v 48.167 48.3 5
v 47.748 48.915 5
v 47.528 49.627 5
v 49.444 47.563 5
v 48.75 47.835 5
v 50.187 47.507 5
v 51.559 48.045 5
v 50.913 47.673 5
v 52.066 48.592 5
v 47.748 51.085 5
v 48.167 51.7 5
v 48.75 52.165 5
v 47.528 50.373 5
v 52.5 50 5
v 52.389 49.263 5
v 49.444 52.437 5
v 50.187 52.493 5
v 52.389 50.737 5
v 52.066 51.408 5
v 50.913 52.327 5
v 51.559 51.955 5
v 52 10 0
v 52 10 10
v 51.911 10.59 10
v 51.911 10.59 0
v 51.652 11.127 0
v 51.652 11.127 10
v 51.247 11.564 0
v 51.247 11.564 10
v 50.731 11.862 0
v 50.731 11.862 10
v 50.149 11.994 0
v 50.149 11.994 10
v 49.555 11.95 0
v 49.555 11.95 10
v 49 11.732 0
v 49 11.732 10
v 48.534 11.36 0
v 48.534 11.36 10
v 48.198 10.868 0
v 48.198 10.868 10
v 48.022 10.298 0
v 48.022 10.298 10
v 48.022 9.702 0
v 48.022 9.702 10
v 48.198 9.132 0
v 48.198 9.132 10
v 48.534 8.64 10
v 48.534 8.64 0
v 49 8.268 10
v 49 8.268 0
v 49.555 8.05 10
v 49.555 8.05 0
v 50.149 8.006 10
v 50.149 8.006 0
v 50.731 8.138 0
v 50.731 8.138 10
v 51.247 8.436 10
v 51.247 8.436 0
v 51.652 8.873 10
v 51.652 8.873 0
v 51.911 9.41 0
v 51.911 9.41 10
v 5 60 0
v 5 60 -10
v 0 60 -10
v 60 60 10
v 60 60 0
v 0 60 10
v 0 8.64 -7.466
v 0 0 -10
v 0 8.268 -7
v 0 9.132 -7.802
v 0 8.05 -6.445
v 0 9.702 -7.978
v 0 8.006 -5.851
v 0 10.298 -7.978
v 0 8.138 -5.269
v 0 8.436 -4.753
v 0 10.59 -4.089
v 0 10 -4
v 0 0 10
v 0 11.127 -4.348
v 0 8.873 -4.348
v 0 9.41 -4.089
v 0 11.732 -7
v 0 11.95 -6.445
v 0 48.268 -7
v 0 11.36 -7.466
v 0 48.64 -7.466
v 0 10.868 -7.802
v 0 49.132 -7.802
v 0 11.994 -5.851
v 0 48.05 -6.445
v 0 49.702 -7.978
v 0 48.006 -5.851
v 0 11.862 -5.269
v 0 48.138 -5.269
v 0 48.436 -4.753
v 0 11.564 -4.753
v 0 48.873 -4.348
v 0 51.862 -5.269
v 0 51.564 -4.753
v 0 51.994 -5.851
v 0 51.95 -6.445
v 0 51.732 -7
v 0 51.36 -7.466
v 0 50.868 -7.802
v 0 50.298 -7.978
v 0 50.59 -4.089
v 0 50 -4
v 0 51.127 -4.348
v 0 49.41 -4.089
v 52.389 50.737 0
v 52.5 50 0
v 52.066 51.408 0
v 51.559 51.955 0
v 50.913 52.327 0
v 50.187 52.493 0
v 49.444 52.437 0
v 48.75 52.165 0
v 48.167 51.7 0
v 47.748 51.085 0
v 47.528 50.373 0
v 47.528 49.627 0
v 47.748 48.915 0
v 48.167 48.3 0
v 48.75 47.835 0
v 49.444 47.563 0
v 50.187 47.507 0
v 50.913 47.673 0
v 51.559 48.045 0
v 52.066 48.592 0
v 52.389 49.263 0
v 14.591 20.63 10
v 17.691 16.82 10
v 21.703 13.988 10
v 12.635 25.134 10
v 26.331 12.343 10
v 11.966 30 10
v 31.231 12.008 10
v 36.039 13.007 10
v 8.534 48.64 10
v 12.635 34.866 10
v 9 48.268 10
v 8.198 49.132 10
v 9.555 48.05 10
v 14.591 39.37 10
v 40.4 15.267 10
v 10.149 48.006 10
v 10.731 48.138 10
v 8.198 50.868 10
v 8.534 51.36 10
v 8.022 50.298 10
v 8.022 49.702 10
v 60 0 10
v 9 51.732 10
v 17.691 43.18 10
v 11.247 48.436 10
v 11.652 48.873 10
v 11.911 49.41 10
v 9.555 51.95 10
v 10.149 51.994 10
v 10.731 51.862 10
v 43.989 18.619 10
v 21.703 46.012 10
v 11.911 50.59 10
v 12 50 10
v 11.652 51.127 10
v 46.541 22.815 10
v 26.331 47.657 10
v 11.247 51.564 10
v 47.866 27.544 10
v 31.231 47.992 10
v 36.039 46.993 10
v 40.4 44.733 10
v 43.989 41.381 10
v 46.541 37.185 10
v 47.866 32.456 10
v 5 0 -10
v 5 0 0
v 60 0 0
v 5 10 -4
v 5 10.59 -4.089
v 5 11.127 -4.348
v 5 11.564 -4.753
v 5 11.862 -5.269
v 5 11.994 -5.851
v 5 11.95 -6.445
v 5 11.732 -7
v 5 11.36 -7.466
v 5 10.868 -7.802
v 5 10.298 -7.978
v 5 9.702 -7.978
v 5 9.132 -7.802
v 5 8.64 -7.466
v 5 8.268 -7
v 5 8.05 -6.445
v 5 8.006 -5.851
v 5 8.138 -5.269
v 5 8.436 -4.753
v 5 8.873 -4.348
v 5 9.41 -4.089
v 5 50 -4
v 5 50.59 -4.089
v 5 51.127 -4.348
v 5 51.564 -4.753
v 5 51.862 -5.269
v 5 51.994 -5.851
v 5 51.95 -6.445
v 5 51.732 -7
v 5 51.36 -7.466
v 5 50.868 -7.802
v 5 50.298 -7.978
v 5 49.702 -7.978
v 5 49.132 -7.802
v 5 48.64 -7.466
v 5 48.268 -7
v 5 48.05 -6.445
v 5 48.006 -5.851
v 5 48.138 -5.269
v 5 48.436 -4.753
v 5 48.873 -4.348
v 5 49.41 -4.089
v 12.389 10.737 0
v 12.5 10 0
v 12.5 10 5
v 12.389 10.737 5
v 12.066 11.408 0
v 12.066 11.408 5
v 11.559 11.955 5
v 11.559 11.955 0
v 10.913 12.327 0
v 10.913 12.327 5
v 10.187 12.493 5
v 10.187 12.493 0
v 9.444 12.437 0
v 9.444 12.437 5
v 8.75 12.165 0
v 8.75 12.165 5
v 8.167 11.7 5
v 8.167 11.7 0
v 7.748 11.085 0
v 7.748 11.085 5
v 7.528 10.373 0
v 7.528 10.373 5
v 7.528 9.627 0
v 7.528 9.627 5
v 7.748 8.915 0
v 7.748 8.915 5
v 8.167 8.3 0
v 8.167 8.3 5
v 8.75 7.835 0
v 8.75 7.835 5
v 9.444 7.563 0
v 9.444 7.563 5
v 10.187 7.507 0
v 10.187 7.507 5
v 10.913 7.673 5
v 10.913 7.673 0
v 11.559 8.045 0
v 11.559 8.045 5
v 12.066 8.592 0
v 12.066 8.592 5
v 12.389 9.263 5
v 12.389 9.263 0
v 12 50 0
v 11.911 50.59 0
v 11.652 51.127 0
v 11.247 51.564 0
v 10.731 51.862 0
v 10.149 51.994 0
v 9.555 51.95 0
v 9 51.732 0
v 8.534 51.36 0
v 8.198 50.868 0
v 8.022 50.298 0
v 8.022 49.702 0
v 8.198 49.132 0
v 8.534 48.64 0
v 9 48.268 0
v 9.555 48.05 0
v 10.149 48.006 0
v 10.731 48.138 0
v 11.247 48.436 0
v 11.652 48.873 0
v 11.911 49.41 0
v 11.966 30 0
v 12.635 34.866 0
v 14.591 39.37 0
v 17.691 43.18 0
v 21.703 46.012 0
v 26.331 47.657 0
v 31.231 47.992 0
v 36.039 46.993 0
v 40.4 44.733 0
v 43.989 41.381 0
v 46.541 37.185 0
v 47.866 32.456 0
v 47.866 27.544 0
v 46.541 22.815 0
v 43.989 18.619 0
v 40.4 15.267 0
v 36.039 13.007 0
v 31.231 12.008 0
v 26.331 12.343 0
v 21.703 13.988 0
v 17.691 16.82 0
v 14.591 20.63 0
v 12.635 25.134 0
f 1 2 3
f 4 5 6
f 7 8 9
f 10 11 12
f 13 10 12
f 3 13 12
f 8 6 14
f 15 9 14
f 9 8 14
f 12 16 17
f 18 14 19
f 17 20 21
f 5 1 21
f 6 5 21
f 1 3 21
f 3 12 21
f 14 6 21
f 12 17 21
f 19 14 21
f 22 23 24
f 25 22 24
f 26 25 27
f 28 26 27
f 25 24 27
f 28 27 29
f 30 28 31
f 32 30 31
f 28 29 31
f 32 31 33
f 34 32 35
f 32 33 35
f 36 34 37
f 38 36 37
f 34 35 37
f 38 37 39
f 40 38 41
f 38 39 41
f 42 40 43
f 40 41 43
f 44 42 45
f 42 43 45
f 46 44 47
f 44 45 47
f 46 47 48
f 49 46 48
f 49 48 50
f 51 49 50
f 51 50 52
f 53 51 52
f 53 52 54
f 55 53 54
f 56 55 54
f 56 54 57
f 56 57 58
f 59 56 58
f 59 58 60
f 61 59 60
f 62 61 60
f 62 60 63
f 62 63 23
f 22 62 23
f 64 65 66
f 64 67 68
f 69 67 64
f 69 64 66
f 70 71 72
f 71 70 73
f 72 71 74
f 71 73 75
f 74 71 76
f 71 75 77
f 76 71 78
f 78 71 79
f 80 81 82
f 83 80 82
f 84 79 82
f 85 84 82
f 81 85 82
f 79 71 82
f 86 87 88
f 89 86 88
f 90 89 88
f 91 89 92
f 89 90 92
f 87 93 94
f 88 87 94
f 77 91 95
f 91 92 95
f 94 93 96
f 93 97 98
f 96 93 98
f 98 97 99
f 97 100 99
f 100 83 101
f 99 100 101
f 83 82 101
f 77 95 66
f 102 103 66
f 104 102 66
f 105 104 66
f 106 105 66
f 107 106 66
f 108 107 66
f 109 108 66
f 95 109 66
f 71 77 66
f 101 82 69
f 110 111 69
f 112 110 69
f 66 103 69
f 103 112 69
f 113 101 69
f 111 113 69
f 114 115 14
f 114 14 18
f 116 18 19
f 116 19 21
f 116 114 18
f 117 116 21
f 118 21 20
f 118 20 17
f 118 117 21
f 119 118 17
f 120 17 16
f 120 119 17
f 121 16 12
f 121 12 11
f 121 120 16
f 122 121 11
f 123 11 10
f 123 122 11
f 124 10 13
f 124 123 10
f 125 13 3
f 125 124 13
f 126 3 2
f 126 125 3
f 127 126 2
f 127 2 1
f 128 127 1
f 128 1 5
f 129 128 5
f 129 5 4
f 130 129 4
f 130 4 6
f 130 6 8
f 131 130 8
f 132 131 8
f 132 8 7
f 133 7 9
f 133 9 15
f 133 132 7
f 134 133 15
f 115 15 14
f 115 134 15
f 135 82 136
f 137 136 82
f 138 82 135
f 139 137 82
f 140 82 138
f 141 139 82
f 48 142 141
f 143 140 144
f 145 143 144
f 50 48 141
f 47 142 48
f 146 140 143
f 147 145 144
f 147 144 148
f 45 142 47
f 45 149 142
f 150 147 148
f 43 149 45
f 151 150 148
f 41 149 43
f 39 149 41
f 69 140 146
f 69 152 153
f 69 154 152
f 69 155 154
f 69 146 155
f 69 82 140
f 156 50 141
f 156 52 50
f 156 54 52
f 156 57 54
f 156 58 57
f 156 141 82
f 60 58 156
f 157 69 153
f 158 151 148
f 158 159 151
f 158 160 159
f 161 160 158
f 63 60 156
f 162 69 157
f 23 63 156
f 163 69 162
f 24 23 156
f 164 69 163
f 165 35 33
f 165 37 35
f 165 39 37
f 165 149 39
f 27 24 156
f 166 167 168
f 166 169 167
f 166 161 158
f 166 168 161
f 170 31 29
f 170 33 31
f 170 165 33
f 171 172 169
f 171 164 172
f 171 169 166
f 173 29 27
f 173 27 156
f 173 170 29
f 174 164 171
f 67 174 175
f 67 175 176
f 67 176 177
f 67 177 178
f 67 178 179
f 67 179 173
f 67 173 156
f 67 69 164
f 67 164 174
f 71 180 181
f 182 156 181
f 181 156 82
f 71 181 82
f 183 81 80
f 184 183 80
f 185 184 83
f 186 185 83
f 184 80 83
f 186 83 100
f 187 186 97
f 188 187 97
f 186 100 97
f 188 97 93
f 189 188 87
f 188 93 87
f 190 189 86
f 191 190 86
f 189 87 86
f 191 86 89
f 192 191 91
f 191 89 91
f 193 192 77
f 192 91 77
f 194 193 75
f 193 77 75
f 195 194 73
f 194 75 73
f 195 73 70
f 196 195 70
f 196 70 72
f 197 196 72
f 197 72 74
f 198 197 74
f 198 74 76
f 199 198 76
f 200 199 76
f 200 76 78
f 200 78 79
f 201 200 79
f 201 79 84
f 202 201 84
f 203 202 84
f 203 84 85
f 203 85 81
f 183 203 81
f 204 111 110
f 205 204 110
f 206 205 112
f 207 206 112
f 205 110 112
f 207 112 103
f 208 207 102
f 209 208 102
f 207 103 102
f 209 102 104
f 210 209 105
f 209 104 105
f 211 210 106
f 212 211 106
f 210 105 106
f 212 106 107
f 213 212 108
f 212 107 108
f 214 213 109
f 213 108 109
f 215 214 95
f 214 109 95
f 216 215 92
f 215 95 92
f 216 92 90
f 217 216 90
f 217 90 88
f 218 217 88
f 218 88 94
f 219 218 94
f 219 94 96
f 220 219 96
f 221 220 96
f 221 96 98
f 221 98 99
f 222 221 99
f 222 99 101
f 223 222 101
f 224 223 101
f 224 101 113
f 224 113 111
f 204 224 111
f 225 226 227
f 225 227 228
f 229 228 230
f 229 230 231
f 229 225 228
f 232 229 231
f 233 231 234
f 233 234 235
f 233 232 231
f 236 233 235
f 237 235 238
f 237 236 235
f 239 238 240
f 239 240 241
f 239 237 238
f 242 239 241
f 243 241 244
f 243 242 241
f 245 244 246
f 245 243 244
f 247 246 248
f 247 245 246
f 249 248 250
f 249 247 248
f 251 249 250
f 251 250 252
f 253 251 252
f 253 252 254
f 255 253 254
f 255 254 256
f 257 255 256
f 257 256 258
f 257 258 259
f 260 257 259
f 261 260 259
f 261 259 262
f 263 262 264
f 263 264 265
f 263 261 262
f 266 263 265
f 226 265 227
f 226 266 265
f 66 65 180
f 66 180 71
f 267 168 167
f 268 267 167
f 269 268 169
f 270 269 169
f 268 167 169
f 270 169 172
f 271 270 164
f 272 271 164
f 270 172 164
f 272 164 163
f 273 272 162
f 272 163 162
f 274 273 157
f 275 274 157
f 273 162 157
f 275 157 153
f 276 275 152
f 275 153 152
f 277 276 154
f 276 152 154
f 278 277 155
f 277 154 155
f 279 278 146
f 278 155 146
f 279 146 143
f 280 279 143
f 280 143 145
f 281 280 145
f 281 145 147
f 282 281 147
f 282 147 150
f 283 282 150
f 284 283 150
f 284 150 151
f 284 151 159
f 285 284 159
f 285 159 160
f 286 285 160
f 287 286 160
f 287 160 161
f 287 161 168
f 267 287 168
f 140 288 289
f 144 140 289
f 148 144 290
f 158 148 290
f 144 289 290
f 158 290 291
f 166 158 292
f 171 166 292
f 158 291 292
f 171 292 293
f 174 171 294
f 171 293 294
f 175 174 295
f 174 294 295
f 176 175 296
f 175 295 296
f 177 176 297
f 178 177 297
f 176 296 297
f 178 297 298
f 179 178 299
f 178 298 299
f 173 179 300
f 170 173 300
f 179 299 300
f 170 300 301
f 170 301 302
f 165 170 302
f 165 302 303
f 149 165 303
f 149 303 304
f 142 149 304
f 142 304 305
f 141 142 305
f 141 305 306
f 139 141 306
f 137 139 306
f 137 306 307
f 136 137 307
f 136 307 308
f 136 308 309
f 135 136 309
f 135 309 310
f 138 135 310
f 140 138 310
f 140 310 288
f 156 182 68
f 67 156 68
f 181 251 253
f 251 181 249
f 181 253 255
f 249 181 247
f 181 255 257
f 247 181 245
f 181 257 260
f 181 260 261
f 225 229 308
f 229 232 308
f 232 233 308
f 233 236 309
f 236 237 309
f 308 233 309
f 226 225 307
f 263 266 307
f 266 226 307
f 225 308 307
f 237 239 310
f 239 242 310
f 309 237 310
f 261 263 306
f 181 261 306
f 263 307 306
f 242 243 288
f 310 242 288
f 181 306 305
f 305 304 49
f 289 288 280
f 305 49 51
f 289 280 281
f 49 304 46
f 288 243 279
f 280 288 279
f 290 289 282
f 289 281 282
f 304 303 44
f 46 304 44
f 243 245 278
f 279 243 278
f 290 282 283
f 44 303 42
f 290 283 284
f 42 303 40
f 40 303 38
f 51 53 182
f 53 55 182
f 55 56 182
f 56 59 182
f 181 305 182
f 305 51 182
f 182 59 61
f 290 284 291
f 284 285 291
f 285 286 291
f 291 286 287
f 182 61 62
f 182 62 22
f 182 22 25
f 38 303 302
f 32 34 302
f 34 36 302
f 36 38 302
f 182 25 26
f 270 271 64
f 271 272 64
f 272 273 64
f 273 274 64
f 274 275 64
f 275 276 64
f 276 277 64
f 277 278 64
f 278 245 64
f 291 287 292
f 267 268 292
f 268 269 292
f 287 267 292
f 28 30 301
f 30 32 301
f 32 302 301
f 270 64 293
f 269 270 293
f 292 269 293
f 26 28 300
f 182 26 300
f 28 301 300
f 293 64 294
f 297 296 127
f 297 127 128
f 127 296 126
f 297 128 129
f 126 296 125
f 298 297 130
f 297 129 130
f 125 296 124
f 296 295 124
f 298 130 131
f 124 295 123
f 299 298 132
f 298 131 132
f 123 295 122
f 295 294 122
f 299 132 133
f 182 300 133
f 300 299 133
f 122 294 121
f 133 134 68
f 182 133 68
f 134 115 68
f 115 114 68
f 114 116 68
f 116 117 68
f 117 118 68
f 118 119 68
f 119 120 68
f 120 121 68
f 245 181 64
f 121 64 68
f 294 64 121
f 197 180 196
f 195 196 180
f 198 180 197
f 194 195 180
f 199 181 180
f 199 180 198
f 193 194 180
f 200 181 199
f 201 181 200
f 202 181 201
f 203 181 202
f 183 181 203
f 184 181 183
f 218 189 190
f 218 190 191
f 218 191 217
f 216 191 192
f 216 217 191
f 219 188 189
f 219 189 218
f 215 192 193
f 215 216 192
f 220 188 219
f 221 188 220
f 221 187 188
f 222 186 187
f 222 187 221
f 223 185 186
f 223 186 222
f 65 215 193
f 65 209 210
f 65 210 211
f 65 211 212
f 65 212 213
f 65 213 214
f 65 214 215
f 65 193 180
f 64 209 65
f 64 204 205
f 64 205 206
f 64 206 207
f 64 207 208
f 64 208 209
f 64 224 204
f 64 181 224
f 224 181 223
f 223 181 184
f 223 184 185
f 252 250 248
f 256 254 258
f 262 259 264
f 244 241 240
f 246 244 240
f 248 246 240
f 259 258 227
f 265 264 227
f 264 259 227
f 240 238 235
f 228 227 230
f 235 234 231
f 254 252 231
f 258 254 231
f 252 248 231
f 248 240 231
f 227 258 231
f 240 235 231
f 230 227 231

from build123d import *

# Parameters (mm, degrees)
SKETCH1_W           = 60
SKETCH1_H           = 60
BOSS_EXTRUDE1_DEPTH = 10
SKETCH2_R           = 18.034
CUT_EXTRUDE1_DEPTH  = 86.440037453
SKETCH4_W           = 5
SKETCH4_H           = 60
BOSS_EXTRUDE2_DEPTH = 10
SKETCH5_R           = 2
CUT_EXTRUDE3_DEPTH  = 86.440037453
CAVITY3_OUTLINE_R   = 2.5
CAVITY3_DEPTH       = 5
SKETCH7_R           = 2
CUT_EXTRUDE4_DEPTH  = 88.177978871


# Read off the part's stored shape, not the designer's step: Cavity3
with BuildPart() as part:
    # Sketch1 → Boss-Extrude1 (new body)
    with BuildSketch(Plane.XY):
        with Locations((30, 30)):
            Rectangle(SKETCH1_W, SKETCH1_H)
    extrude(amount=BOSS_EXTRUDE1_DEPTH)

    # Sketch2 → Cut-Extrude1 (cut, through all)
    with BuildSketch(Plane(origin=(0, 0, 0), x_dir=(-1, 0, 0), z_dir=(0, 0, -1))):
        with Locations((-30, 30)):
            Circle(SKETCH2_R)
    extrude(amount=-CUT_EXTRUDE1_DEPTH, mode=Mode.SUBTRACT)

    # Sketch4 → Boss-Extrude2 (add)
    with BuildSketch(Plane(origin=(0, 0, 0), x_dir=(-1, 0, 0), z_dir=(0, 0, -1))):
        with Locations((-2.5, 30)):
            Rectangle(SKETCH4_W, SKETCH4_H)
    extrude(amount=BOSS_EXTRUDE2_DEPTH)

    # Sketch5 → Cut-Extrude3 (cut, through all)
    with BuildSketch(Plane.ZY):
        with Locations((-6, 50)):
            Circle(SKETCH5_R)
        with Locations((-6, 10)):
            Circle(SKETCH5_R)
    extrude(amount=-CUT_EXTRUDE3_DEPTH, mode=Mode.SUBTRACT)

    # Cavity3 outline → Cavity3 (cut)
    with BuildSketch(Plane.XY):
        with Locations((10, 10)):
            Circle(CAVITY3_OUTLINE_R)
        with Locations((50, 50)):
            Circle(CAVITY3_OUTLINE_R)
    extrude(amount=CAVITY3_DEPTH, mode=Mode.SUBTRACT)

    # Sketch7 → Cut-Extrude4 (cut, through all)
    with BuildSketch(Plane.XY.offset(10)):
        with Locations((10, 50)):
            Circle(SKETCH7_R)
        with Locations((50, 10)):
            Circle(SKETCH7_R)
    extrude(amount=-CUT_EXTRUDE4_DEPTH, mode=Mode.SUBTRACT)


solid = part.part
